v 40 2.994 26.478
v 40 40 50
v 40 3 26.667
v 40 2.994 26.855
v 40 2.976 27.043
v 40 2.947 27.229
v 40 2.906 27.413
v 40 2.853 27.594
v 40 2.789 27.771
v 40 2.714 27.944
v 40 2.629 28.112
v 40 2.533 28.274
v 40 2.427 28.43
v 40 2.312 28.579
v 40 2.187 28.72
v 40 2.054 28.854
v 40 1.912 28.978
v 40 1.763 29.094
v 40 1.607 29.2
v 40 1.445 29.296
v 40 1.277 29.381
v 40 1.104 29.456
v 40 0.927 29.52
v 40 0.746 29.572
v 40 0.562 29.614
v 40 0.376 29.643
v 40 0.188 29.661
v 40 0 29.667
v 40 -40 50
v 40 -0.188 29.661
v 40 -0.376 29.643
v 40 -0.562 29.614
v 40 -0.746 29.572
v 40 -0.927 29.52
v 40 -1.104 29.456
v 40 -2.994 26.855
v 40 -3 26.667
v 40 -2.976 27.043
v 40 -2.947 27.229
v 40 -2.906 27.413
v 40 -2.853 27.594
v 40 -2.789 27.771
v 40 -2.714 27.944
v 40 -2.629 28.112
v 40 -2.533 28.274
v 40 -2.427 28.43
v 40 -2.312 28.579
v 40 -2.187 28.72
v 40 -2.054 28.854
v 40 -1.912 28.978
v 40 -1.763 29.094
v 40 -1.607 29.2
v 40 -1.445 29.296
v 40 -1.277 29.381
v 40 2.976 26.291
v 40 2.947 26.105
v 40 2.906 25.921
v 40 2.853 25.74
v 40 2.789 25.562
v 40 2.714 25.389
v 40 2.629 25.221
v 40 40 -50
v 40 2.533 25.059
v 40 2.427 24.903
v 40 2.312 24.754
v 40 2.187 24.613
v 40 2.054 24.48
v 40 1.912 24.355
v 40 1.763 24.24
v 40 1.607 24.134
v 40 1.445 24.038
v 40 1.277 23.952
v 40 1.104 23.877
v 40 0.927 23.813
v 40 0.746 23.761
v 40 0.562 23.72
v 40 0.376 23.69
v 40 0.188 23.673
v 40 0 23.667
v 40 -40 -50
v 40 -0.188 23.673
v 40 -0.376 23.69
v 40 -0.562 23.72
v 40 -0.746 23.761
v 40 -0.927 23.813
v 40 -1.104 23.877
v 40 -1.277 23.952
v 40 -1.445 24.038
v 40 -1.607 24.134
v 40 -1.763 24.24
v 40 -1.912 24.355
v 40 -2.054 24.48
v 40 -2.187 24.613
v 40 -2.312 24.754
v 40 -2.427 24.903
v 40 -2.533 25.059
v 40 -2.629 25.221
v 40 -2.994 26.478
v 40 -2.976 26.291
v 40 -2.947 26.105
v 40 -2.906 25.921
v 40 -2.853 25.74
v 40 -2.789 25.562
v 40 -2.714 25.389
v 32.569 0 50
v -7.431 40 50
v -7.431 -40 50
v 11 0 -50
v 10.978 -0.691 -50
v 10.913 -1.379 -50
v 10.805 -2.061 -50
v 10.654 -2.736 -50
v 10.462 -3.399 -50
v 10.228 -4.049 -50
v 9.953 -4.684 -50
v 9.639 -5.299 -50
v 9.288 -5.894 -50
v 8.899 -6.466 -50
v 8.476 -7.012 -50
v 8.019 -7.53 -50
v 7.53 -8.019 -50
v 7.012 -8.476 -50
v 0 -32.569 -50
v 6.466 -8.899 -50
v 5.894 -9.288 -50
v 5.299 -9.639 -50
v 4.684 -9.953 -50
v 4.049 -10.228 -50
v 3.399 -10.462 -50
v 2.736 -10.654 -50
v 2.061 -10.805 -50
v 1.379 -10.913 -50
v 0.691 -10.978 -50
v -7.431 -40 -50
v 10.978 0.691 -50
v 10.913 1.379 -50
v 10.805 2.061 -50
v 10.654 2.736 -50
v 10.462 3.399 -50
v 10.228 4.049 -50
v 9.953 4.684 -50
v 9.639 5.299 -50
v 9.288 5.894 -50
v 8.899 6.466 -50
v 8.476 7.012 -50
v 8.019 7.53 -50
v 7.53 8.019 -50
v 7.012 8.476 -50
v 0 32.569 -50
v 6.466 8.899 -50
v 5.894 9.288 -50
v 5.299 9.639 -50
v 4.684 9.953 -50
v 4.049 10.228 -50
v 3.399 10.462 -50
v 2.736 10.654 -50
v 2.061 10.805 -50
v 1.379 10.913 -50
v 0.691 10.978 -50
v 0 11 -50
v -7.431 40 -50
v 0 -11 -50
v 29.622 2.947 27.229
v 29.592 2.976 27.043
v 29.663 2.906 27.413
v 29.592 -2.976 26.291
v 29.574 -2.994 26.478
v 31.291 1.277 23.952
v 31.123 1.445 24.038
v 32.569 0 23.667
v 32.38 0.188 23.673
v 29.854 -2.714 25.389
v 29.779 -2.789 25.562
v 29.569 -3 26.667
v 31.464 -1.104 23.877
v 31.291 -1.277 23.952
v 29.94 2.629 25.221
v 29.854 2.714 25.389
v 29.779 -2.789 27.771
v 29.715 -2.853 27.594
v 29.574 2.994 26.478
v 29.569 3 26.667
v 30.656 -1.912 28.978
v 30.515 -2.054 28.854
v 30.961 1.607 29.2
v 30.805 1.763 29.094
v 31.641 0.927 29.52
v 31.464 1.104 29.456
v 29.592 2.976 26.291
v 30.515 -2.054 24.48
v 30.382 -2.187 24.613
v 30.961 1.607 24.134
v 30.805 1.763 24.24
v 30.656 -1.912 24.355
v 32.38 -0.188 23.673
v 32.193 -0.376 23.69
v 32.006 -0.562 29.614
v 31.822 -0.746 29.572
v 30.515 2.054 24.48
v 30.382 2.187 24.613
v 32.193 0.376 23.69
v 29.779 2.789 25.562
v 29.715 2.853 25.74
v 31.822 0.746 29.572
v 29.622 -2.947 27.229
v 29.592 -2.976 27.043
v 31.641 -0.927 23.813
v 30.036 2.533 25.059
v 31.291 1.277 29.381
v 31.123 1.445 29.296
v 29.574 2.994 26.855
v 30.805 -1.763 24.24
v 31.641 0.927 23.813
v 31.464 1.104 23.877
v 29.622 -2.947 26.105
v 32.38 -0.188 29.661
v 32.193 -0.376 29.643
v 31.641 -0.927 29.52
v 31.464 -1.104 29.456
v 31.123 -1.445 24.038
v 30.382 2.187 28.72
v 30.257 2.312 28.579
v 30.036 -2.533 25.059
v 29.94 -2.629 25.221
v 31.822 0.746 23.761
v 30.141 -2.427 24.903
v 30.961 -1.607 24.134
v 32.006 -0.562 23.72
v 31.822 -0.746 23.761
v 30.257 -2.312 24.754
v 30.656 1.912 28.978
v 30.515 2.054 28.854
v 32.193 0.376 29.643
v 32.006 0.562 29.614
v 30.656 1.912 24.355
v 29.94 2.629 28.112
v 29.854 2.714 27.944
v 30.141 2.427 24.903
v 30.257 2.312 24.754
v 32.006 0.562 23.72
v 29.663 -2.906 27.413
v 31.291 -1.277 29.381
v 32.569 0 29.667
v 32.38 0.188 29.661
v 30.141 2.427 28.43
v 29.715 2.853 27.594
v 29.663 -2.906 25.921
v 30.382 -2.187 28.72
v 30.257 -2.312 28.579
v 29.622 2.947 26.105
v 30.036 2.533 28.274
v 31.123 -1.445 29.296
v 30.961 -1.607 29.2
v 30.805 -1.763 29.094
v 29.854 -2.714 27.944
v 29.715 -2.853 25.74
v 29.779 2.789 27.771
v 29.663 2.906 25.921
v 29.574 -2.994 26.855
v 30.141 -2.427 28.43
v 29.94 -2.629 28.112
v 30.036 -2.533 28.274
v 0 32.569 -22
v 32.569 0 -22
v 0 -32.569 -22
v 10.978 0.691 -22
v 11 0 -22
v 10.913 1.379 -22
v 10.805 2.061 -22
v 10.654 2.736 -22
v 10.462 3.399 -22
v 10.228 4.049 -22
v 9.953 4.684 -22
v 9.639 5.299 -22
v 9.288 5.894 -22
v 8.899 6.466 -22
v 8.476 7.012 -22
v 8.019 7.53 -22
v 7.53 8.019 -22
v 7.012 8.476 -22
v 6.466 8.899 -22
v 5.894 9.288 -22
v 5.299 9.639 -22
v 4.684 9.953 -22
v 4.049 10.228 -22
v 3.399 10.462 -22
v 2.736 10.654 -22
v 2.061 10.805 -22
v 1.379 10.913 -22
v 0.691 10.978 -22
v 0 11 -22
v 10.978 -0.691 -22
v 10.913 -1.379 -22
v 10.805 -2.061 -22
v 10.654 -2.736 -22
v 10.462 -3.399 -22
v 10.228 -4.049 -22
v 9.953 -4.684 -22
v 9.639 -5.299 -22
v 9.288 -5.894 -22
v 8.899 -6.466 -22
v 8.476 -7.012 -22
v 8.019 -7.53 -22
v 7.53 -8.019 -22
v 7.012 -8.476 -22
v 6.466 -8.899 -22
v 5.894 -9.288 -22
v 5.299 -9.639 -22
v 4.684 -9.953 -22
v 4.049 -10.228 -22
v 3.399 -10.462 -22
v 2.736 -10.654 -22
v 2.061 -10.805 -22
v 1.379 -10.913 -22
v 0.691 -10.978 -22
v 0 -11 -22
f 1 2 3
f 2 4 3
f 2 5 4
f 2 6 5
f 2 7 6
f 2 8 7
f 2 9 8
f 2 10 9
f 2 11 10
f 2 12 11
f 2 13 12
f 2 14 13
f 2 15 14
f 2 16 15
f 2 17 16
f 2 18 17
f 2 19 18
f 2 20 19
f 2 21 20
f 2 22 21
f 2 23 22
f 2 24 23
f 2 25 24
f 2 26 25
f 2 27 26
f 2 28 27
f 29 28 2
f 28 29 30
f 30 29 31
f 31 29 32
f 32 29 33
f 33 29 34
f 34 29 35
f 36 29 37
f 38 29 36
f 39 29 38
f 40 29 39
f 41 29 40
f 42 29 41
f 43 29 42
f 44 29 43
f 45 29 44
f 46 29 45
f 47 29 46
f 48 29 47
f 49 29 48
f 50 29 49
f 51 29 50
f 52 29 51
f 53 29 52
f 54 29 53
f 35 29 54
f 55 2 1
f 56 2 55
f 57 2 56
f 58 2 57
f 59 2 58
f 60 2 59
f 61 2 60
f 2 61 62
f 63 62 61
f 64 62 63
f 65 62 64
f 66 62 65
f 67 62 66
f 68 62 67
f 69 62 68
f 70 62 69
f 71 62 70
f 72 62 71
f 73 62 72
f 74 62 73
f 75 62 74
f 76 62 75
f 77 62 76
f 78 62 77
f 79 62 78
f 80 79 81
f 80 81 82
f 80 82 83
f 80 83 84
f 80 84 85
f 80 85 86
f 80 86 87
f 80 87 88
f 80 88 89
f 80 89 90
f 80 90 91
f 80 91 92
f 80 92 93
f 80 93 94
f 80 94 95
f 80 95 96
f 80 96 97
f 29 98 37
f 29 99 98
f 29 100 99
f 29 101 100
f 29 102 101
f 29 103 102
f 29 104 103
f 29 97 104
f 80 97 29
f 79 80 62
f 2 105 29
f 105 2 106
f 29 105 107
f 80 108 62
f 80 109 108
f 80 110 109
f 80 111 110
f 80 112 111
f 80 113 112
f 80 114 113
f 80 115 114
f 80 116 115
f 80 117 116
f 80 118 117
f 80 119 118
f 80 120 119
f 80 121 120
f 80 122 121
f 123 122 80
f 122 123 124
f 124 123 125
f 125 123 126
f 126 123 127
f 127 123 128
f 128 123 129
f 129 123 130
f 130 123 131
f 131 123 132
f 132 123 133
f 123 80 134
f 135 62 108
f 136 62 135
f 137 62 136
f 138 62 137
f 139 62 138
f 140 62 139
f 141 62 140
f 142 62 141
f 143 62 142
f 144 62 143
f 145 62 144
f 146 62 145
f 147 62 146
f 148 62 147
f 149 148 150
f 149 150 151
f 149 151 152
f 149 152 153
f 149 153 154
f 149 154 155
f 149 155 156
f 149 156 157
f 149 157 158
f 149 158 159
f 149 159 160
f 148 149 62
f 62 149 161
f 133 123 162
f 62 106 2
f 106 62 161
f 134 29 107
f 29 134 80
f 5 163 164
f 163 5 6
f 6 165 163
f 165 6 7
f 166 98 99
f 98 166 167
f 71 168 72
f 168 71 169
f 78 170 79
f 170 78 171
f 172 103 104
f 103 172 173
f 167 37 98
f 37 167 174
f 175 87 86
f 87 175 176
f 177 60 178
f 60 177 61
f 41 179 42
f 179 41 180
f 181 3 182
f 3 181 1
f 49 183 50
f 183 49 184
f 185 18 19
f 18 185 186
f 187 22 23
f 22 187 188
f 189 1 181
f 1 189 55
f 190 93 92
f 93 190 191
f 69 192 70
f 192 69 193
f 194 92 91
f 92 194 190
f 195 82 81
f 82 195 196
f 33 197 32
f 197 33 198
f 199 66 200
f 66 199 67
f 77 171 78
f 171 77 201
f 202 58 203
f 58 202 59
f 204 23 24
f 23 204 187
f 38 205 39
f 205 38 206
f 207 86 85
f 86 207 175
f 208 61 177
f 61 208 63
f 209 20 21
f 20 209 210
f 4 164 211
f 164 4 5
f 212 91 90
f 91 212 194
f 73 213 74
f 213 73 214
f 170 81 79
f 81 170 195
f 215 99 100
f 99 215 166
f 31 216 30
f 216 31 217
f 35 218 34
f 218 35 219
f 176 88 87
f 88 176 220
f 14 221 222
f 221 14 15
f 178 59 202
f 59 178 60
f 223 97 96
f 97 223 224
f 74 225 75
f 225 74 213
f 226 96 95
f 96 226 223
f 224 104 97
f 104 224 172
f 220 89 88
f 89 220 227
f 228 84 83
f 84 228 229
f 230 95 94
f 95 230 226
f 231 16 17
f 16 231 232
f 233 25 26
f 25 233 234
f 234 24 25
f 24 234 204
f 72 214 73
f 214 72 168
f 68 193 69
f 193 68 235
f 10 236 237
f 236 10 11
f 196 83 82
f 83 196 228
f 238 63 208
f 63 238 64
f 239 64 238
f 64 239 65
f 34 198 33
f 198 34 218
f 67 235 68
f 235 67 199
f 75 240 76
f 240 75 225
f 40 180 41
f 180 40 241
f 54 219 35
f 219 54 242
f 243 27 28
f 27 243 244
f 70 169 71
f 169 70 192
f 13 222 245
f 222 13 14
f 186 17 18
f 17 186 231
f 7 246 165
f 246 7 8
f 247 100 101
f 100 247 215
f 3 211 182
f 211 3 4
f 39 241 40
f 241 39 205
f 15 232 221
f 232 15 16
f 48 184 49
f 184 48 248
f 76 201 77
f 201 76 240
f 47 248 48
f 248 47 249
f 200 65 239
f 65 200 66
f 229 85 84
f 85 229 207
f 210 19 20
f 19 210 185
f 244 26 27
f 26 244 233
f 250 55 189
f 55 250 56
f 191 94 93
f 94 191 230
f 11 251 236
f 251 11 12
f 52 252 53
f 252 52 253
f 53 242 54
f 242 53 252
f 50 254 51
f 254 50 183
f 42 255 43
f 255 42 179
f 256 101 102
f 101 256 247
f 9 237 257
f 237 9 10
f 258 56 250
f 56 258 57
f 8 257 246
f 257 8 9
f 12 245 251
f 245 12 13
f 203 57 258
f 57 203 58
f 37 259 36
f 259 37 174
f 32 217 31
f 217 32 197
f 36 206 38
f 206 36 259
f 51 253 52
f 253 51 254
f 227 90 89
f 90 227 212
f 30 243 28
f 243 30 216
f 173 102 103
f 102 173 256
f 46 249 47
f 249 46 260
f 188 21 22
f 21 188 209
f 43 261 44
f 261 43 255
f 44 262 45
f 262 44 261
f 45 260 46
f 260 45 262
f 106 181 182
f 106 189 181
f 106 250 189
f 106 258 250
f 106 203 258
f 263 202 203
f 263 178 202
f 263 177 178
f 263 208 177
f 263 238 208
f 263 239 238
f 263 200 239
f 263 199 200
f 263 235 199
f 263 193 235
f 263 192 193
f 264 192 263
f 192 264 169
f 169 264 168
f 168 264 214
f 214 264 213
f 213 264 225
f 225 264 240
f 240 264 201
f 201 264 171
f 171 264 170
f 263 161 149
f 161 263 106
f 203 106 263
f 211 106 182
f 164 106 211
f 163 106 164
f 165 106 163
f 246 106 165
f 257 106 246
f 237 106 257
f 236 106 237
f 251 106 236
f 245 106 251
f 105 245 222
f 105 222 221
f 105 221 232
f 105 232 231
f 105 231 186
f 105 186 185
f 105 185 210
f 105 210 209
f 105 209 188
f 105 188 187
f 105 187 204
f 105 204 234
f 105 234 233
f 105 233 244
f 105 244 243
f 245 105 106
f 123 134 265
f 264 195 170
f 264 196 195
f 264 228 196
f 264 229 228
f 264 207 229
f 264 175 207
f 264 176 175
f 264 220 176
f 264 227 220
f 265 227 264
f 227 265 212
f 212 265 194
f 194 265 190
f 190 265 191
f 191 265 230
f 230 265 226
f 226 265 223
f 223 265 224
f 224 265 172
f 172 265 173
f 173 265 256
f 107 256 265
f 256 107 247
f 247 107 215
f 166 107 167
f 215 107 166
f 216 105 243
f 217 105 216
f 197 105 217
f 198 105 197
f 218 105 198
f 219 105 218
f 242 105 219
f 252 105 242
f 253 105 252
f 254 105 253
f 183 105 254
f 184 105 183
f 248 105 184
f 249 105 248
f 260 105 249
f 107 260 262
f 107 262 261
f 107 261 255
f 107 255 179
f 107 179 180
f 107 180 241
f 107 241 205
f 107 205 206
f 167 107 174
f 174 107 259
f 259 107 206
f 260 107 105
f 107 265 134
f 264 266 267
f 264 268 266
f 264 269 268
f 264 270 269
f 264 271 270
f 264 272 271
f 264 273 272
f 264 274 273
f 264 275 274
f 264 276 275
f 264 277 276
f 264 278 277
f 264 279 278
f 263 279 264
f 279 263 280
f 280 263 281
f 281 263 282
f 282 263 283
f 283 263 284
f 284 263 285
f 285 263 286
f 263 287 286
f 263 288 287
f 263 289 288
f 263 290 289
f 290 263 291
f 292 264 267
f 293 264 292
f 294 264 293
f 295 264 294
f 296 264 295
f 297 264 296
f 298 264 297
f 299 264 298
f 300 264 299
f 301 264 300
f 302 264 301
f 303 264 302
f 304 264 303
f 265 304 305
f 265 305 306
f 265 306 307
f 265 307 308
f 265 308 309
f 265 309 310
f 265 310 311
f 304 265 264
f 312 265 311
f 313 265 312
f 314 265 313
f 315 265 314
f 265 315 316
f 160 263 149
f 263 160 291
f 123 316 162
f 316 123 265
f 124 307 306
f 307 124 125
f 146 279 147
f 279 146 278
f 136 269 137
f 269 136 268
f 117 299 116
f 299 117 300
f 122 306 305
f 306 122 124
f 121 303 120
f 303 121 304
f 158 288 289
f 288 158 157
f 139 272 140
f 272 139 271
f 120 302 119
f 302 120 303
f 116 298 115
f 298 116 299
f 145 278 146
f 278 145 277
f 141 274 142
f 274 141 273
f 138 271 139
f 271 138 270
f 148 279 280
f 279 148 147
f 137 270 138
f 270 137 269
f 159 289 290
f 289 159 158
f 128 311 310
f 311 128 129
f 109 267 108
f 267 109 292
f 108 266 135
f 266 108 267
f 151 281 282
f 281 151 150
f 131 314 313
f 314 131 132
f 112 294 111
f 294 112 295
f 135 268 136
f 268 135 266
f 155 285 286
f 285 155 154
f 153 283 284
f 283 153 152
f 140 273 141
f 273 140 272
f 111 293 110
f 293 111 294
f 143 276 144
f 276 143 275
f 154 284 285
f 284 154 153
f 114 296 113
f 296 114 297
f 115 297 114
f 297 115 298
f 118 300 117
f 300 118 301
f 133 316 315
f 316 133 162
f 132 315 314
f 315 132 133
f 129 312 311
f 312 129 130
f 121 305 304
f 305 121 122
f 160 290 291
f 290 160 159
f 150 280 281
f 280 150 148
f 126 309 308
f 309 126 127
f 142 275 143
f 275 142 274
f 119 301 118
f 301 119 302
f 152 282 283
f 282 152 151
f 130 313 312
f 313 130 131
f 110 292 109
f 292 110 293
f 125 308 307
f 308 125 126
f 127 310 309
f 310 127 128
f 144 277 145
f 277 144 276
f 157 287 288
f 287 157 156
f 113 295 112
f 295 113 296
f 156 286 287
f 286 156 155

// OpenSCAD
pumpside = 24;
holderside = 80;
screwdiameter = 3;
pumplength = 100; 
holeXtranslate = 0.5*pumpside + (holderside-pumpside) / 2 - screwdiameter*3;
piperadius = 11;
union(){
    difference(){
        cube(center=true, [holderside,holderside,pumplength]);
        cube(center=true, [pumpside,pumpside,pumplength+10]);
        translate([pumpside/2+screwdiameter,0,holderside/3])rotate([0,90,0])cylinder(r=screwdiameter, h=100, $fn=100, center=true);
        translate([pumpside/2+screwdiameter,0,holderside/3])rotate([0,90,0])cylinder(r1=screwdiameter*3, r2=1, h=10, $fn=100, center=true); //senklocch
        translate([pumpside/2+screwdiameter,0,-holderside/3])rotate([0,90,0])cylinder(r=screwdiameter, h=100, $fn=100, center=true);
        translate([pumpside/2+screwdiameter,0,-holderside/3])rotate([0,90,0])cylinder(r1=screwdiameter*3, r2=1, h=10, $fn=100, center=true); //senklocch

        translate([-pumpside,0,0])rotate([0,0,45])cube(center=true, [holderside,holderside,pumplength+10]);
    }
    difference(){
        translate([0,-holderside/2, -pumplength/2])cube([holderside/2, holderside, (holderside-pumpside)/2]);
        translate([0,0,-1])cylinder(r=piperadius, h= pumplength, $fn=100, center=true);
    }
}
